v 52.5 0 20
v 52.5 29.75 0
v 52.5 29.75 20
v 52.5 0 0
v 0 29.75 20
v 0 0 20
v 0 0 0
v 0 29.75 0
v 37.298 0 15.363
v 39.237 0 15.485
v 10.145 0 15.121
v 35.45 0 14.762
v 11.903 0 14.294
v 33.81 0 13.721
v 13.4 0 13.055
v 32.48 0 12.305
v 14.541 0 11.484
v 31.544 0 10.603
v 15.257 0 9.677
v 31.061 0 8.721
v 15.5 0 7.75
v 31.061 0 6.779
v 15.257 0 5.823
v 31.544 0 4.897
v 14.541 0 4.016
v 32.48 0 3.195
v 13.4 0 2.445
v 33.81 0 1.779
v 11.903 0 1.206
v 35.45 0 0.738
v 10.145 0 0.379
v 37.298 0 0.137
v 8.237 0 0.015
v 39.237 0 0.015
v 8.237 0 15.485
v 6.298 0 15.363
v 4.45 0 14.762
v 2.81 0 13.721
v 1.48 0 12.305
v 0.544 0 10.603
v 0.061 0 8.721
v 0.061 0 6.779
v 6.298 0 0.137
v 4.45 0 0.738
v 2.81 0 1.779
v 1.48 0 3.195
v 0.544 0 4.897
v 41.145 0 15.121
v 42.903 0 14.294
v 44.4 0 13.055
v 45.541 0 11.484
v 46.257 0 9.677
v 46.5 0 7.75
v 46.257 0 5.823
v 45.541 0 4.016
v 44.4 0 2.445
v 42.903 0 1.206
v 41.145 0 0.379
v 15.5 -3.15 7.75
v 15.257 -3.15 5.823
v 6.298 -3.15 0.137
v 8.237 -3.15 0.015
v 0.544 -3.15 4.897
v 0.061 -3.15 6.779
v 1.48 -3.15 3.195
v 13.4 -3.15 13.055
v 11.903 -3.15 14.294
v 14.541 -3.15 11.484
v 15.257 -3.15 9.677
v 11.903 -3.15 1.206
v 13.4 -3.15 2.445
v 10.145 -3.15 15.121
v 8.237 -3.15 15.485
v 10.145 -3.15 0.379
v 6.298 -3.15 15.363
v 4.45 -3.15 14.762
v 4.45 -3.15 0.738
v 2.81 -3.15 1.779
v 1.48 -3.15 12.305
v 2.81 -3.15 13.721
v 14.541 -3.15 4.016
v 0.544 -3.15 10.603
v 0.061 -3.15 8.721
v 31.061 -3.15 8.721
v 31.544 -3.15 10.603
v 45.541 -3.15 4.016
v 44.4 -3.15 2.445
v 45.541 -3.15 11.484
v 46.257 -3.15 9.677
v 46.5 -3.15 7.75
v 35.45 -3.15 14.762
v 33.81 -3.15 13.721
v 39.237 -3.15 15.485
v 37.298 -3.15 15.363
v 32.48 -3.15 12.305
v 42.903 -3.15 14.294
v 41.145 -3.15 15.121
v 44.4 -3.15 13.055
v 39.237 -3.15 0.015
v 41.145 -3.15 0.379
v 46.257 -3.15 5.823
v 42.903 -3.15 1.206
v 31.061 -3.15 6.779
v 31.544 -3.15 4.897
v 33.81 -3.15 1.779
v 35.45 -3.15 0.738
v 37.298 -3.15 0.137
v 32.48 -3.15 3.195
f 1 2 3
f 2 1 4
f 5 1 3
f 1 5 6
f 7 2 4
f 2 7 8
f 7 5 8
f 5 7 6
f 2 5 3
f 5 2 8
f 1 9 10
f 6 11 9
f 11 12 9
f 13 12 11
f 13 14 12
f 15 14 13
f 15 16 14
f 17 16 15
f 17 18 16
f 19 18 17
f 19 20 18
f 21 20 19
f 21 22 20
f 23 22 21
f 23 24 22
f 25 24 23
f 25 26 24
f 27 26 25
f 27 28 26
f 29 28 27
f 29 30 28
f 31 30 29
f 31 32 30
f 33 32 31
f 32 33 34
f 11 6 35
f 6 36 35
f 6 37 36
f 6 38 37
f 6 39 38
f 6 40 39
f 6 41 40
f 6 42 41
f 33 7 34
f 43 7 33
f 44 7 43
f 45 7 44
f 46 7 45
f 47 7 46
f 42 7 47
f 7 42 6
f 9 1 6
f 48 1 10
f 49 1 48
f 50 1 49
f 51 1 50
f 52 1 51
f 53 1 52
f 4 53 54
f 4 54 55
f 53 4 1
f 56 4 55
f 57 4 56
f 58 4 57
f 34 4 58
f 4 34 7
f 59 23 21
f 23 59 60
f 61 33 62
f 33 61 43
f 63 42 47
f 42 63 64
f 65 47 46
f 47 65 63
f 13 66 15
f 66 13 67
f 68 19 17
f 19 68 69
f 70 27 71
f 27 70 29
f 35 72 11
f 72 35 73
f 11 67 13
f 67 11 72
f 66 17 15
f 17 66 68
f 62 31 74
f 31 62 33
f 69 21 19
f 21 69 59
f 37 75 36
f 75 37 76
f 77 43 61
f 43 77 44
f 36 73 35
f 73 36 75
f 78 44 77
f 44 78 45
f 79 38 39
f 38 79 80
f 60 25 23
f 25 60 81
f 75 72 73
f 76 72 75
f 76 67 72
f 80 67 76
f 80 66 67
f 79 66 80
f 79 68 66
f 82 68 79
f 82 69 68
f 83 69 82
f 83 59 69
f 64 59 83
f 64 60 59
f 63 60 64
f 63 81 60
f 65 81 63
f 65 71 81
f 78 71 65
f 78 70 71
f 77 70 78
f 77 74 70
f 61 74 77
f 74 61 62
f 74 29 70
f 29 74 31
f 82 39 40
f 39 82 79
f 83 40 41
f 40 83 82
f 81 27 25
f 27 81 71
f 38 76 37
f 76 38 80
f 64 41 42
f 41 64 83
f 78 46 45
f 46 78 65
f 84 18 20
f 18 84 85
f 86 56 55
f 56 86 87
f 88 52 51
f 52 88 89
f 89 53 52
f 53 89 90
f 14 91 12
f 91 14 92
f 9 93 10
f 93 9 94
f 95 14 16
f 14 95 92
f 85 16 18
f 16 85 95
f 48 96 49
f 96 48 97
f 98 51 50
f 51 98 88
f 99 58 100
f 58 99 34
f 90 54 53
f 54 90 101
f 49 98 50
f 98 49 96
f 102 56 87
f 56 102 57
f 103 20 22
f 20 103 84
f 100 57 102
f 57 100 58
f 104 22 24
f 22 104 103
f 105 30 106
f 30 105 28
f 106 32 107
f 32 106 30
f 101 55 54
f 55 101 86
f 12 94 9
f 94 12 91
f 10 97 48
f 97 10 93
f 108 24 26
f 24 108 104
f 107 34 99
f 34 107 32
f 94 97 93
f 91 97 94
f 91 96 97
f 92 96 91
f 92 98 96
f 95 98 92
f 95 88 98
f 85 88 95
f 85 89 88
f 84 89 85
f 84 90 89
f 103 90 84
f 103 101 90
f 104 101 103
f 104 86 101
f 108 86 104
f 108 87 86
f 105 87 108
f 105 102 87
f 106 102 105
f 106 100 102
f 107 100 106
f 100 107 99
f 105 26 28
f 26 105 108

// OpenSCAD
length=103;
height=26.6;
width=29.75;
top_r=138.5;
handle_w=16.65;
handle_middle=((width-handle_w)/2)+handle_w/2;

speaker_d=29.75;
curve_diff=16.5;


module body() {
    intersection() {
        translate([0,(width-handle_w)/2,0])cube([length,handle_w,height]);
        translate([length/2,width/2,top_r])sphere(top_r);
    };
};

module speaker(x,y,z) {
    translate([x,y,z])sphere(speaker_d/2);
};

module crude_handset() {
    speaker_h=21;
    union() {
        body();
        //speaker(speaker_d/4,handle_middle,speaker_h);
        //speaker(length-speaker_d/4,handle_middle,speaker_h);
    };
};

module handle() {
    cyl_d=15.5;
    cyl_r=cyl_d/2;
    inside_len=52.5;
    inside_h=20;
    intersection() {
        //translate([])sphere(top_r);
        union() {
            translate([])cube([inside_len,width,inside_h]);
            rotate([90,0,0])translate([cyl_r,cyl_r,-height])cylinder(h=width,r=cyl_r);
            rotate([90,0,0])translate([cyl_r+31,cyl_r,-height])cylinder(h=width,r=cyl_r);
        };
    };
    
};

difference() {
    //crude_handset();
    //translate([length/2,width/2,top_r+curve_diff])sphere(top_r);
    handle();
};
